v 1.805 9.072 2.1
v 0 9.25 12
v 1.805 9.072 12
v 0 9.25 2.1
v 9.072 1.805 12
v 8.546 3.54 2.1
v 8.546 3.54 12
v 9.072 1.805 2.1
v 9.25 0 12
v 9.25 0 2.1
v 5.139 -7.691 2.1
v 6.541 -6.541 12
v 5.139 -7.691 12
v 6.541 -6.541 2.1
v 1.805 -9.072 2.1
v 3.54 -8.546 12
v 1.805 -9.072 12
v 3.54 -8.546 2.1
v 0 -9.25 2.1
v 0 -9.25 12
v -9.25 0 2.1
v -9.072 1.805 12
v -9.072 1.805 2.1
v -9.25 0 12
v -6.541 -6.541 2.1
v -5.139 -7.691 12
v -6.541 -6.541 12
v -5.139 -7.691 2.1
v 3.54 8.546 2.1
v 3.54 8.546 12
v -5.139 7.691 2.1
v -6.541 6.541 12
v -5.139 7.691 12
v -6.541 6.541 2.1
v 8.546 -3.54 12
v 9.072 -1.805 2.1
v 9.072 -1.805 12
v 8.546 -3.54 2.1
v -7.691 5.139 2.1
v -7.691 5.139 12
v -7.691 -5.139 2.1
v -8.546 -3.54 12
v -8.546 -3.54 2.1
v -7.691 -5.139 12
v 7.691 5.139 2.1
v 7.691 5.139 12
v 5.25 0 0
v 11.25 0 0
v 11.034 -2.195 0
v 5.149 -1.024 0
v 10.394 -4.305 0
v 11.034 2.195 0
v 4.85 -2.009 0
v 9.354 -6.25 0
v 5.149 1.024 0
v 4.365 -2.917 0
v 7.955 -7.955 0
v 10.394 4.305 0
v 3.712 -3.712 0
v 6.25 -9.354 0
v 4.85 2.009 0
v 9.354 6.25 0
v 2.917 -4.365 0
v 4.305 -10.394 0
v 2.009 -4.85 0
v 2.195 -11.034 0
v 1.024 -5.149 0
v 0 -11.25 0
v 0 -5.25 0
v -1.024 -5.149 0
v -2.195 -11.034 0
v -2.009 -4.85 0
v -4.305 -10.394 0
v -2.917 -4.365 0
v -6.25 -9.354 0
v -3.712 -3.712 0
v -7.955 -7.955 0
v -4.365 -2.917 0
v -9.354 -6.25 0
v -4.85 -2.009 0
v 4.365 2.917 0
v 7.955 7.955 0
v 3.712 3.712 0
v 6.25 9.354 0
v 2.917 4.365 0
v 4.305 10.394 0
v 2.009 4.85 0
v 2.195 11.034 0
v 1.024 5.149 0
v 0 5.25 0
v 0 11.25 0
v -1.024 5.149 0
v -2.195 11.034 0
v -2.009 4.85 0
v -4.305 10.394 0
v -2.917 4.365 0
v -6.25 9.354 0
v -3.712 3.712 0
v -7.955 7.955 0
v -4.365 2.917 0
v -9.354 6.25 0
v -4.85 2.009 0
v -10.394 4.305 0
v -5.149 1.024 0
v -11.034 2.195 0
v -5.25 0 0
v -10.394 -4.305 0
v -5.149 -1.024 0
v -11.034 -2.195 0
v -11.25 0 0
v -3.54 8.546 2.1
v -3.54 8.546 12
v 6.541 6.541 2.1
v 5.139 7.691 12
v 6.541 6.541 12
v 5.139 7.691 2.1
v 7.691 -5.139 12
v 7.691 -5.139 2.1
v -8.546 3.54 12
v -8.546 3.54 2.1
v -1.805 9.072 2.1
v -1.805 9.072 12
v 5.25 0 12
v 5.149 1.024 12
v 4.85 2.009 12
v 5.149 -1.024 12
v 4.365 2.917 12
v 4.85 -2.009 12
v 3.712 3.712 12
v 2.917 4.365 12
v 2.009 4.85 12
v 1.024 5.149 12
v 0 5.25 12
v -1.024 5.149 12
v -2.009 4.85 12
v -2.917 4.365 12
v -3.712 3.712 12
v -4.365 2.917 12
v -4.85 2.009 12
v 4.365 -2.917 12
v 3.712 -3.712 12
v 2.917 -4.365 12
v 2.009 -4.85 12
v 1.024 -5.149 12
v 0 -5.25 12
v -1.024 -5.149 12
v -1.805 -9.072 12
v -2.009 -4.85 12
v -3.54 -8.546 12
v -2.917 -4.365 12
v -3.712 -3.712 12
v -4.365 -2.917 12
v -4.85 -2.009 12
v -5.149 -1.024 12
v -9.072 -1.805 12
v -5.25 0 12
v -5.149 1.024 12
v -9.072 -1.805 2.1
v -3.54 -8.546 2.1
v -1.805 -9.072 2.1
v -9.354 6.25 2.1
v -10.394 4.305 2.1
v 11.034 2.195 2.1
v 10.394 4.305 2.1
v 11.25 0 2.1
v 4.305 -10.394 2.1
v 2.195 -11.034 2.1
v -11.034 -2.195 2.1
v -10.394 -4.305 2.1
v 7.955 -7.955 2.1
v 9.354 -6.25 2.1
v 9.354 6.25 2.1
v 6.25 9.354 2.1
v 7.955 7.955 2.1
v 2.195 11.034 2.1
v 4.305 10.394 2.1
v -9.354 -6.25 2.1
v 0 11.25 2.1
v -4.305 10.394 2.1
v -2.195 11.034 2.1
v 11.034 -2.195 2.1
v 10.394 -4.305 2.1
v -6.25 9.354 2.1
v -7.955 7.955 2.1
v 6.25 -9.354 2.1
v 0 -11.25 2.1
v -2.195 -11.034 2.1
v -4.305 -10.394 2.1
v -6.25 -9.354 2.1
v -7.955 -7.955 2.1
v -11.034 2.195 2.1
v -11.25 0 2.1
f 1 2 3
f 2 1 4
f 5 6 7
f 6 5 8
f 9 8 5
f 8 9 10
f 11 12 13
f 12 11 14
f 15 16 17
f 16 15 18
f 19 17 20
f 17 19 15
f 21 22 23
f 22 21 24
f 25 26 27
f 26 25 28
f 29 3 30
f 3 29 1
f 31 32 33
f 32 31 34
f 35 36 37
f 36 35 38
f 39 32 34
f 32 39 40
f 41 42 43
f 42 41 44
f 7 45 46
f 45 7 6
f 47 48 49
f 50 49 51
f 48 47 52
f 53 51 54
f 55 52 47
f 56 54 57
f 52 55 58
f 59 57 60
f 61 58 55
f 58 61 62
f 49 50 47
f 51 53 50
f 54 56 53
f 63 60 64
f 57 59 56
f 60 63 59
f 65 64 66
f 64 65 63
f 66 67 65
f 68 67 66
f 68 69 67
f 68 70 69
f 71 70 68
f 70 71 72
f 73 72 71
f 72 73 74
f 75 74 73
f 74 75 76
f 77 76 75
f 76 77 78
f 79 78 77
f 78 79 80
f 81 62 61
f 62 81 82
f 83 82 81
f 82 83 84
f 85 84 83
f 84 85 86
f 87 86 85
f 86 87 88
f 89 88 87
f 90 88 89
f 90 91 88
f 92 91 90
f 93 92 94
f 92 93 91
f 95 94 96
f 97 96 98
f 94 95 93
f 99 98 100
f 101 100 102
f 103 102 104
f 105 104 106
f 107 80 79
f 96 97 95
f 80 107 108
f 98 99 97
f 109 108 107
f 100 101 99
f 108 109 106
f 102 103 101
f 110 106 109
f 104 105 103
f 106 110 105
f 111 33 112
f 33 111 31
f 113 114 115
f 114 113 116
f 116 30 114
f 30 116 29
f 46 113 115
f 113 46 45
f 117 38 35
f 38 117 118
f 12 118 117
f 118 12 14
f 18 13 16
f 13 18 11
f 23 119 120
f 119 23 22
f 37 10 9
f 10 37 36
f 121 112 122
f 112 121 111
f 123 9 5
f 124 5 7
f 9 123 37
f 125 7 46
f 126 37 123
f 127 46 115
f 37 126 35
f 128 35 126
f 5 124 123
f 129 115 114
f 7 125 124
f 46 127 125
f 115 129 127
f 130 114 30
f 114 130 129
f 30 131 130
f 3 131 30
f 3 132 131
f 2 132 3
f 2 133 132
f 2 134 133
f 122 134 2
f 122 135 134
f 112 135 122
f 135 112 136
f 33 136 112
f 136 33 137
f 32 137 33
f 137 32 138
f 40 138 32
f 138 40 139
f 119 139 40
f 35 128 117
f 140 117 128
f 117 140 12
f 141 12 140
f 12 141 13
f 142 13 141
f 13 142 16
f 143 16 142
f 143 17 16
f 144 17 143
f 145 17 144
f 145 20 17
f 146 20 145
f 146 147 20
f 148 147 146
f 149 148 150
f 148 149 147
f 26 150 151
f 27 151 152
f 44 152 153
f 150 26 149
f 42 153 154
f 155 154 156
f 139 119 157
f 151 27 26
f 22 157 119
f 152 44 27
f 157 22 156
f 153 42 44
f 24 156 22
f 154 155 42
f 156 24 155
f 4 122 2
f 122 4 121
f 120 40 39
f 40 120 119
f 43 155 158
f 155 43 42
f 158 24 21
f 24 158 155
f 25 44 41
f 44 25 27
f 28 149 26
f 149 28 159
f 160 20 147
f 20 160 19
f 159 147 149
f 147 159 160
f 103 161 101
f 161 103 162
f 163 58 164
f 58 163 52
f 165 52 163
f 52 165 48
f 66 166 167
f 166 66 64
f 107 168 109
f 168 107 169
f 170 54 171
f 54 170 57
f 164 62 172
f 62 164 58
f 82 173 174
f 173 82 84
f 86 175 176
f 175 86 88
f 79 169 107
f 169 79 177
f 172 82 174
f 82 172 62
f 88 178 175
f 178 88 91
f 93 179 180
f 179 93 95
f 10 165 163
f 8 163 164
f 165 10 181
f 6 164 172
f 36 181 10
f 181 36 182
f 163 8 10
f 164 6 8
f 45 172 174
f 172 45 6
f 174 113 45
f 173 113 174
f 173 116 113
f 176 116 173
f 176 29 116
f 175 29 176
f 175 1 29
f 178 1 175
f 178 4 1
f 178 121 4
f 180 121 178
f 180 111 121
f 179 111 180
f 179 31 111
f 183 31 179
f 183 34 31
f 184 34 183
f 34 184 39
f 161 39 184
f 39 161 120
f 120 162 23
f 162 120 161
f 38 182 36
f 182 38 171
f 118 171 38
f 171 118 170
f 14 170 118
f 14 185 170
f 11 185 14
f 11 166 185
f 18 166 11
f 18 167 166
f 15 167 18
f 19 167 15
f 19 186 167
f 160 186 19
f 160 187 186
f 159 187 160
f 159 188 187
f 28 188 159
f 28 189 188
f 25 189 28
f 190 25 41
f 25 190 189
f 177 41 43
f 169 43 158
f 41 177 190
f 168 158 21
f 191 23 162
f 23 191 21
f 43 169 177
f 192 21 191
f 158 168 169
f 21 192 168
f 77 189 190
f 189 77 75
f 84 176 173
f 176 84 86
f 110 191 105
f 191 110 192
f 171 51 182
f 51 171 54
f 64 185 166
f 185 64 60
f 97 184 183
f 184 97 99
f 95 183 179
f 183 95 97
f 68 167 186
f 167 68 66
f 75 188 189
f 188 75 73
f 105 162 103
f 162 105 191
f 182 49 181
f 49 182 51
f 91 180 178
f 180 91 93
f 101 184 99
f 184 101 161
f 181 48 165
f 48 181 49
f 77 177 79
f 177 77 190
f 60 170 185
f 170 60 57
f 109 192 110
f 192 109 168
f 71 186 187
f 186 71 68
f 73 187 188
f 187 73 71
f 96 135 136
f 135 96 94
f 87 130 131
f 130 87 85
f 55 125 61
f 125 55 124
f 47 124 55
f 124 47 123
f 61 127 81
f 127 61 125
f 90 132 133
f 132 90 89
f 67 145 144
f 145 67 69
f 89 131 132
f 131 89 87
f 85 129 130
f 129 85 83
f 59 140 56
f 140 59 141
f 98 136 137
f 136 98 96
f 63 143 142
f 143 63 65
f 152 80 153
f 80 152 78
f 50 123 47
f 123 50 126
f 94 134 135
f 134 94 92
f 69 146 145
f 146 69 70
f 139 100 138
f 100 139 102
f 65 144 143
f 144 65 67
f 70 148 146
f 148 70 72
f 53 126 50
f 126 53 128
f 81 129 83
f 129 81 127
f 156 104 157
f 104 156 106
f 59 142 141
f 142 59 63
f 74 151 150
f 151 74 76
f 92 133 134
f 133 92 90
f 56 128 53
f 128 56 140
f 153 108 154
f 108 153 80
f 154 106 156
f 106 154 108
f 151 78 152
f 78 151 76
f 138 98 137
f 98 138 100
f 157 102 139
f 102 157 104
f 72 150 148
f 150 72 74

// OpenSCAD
$fn = 32;

// ----------------------------------------------------------------------
// Spacer sleeve: 18.5 / 10.5 x 12 mm
// ----------------------------------------------------------------------

// --- parameters (mm) ---
sleeve_od = 18.5;         // outside diameter
sleeve_id = 10.5;         // shaft bore
sleeve_l = 12;            // sleeve length
flange_d = 22.5;          // collar diameter
flange_t = 1.5;           // collar thickness

module sleeve() {
  cylinder(h = sleeve_l, d = sleeve_od);
  cylinder(h = flange_t + 0.6, d = flange_d);
}

difference() {
  sleeve();
  translate([0, 0, -1]) cylinder(h = sleeve_l + 2, d = sleeve_id);
}
